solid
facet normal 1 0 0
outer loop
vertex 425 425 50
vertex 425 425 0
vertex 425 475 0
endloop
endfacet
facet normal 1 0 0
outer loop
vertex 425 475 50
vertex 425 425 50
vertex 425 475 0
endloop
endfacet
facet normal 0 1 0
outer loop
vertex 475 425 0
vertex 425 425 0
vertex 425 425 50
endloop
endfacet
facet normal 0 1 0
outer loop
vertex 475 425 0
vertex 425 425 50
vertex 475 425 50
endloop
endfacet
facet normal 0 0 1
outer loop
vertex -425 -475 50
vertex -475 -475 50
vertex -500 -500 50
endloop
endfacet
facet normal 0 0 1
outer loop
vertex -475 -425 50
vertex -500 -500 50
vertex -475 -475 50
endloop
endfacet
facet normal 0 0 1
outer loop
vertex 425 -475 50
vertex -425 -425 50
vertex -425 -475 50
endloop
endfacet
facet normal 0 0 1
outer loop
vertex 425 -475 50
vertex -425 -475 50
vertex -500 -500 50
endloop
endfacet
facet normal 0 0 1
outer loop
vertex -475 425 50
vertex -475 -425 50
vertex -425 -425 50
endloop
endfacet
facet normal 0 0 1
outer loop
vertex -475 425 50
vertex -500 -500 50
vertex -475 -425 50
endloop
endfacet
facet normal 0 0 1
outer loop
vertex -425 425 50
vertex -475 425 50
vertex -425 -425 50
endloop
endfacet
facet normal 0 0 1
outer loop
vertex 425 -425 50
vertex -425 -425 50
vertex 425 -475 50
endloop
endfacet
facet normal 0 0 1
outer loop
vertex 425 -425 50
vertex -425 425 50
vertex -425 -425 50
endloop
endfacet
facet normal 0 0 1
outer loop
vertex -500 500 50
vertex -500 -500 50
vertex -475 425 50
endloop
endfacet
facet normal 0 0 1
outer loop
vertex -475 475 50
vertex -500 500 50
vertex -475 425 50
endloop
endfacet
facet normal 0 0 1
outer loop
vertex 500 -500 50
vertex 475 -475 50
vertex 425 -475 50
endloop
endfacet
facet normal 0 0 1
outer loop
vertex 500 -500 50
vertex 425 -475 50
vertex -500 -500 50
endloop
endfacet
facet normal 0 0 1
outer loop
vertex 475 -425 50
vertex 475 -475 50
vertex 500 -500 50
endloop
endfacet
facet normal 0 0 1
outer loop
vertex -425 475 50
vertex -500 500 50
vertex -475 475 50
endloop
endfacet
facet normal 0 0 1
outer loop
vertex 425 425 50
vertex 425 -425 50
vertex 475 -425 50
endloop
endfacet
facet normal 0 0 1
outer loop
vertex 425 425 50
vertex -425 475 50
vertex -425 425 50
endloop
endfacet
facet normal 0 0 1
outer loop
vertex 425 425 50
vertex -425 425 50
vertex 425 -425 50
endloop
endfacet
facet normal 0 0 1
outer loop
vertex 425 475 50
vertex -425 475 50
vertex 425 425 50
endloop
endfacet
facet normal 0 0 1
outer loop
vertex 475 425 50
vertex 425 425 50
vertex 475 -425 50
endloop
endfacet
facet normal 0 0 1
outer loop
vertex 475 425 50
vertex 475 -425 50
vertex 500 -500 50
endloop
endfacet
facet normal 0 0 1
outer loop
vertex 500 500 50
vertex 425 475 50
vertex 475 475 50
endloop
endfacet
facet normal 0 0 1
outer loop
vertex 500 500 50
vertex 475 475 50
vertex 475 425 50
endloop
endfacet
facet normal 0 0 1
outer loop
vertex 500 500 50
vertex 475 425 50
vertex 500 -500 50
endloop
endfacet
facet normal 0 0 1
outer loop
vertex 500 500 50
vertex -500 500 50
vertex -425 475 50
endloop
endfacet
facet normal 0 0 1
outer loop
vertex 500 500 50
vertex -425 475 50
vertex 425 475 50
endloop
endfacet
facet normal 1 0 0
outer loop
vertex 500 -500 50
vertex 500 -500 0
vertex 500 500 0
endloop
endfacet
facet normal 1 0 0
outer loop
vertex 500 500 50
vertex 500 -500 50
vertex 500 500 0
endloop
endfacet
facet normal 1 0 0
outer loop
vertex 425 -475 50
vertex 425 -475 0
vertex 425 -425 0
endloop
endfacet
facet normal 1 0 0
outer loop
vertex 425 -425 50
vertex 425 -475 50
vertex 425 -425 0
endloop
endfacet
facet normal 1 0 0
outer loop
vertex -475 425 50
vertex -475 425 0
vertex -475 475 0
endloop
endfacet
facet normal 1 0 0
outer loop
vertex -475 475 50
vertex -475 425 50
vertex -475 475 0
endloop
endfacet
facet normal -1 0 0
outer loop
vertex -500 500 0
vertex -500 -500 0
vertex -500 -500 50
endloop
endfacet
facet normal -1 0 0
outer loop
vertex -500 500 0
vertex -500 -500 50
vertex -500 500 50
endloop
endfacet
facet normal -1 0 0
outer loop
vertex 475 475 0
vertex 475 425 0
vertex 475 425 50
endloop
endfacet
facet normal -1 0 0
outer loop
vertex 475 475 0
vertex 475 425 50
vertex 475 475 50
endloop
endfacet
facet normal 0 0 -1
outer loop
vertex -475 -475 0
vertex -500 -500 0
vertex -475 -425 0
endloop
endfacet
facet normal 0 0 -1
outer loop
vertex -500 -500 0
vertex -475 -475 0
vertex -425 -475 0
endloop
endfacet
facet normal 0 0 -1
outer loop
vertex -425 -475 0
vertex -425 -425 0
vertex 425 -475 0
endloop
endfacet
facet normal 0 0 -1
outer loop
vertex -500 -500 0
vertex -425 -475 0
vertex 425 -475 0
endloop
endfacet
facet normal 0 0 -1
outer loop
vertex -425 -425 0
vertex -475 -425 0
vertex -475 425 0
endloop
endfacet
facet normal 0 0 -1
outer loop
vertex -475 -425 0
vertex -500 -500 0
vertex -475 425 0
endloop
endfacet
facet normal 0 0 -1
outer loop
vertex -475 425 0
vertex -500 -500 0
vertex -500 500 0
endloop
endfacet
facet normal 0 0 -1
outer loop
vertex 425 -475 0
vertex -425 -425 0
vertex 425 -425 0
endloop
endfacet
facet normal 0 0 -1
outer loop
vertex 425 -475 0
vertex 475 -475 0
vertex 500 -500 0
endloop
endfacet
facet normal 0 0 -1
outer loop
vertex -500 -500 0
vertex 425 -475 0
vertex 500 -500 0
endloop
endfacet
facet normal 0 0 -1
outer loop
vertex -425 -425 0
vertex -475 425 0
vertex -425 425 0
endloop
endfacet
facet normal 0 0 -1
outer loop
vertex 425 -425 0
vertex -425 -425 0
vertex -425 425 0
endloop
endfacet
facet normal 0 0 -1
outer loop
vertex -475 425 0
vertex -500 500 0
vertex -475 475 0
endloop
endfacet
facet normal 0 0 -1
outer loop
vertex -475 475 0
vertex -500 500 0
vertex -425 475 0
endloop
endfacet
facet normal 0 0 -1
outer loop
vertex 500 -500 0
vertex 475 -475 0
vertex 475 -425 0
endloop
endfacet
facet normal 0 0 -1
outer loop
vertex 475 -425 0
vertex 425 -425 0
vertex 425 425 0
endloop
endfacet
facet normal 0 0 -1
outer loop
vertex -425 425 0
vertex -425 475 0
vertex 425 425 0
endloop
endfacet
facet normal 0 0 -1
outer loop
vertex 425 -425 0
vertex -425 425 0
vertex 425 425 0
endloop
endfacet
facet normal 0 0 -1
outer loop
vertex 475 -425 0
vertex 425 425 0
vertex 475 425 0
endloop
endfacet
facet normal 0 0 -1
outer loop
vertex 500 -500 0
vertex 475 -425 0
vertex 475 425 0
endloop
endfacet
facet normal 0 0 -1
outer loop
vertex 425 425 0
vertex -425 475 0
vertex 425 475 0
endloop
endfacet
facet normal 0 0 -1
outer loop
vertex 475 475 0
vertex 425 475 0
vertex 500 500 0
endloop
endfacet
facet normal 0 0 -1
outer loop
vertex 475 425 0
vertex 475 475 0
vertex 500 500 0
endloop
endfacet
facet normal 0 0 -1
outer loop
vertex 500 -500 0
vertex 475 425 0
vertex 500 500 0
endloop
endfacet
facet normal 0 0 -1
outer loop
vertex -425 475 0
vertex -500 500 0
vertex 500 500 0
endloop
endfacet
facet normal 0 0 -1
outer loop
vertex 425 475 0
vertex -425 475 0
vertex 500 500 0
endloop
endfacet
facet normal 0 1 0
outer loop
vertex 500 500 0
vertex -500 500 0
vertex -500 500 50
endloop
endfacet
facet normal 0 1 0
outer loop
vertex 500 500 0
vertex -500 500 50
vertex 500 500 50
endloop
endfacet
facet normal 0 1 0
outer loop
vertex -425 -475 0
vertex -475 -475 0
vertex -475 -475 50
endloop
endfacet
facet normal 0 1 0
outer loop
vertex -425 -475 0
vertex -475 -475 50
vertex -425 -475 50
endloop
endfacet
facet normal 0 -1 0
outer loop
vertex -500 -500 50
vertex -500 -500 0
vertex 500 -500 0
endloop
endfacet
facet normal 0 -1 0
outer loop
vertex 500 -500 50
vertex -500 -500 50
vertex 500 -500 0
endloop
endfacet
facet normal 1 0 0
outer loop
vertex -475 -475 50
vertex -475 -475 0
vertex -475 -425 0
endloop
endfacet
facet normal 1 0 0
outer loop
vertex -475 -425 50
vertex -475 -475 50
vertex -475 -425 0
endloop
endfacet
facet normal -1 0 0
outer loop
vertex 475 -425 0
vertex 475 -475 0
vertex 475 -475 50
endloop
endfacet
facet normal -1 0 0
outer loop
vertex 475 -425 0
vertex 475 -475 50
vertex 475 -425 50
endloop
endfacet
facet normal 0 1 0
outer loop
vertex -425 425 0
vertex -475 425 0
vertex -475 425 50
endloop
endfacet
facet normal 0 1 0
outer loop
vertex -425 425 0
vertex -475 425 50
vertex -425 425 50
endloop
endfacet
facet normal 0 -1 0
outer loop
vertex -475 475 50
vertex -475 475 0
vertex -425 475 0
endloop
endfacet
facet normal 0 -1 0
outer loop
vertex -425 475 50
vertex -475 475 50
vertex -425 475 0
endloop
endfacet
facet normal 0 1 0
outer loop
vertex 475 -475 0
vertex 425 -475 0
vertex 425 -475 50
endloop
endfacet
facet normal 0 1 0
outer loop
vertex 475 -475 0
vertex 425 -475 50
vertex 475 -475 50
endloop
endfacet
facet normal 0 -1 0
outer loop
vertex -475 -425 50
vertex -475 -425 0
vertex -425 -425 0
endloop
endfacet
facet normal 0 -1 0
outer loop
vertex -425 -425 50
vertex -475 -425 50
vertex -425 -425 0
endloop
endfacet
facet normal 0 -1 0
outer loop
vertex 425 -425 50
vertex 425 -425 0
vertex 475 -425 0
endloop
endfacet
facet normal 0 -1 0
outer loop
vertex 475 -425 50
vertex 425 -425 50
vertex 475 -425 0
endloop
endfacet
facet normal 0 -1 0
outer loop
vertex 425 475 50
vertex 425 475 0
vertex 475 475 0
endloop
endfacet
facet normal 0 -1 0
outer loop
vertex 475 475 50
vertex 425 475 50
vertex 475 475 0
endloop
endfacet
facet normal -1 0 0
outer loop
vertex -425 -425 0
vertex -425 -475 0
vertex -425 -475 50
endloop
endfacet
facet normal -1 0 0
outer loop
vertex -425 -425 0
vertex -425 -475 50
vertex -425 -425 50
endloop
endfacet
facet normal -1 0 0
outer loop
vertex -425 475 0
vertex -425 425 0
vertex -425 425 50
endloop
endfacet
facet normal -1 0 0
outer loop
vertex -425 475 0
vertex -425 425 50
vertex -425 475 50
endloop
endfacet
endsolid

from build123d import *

# Parameters (mm, degrees)
SKETCH_1_W          = 1000
SKETCH_1_H          = 1000
EXTRUDE_1_DEPTH     = 50
SKETCH_2_W          = 50
SKETCH_2_H          = 50
CUT_EXTRUDE_1_DEPTH = 709.872343938
SKETCH_3_W          = 50
SKETCH_3_H          = 50
CUT_EXTRUDE_2_DEPTH = 709.872343938
SKETCH_4_W          = 50
SKETCH_4_H          = 50
CUT_EXTRUDE_3_DEPTH = 709.872343938
SKETCH_5_W          = 50
SKETCH_5_H          = 50
CUT_EXTRUDE_4_DEPTH = 709.872343938


with BuildPart() as part:
    # 草图1 → 凸台-拉伸1 (new body)
    with BuildSketch(Plane.XY):
        Rectangle(SKETCH_1_W, SKETCH_1_H)
    extrude(amount=EXTRUDE_1_DEPTH)

    # 草图2 → 切除-拉伸1 (cut, through all)
    with BuildSketch(Plane.XY):
        with Locations((450, 450)):
            Rectangle(SKETCH_2_W, SKETCH_2_H)
    extrude(amount=CUT_EXTRUDE_1_DEPTH, mode=Mode.SUBTRACT)

    # 草图3 → 切除-拉伸2 (cut, through all)
    with BuildSketch(Plane.XY):
        with Locations((-450, 450)):
            Rectangle(SKETCH_3_W, SKETCH_3_H)
    extrude(amount=CUT_EXTRUDE_2_DEPTH, mode=Mode.SUBTRACT)

    # 草图4 → 切除-拉伸3 (cut, through all)
    with BuildSketch(Plane.XY):
        with Locations((450, -450)):
            Rectangle(SKETCH_4_W, SKETCH_4_H)
    extrude(amount=CUT_EXTRUDE_3_DEPTH, mode=Mode.SUBTRACT)

    # 草图5 → 切除-拉伸4 (cut, through all)
    with BuildSketch(Plane.XY):
        with Locations((-450, -450)):
            Rectangle(SKETCH_5_W, SKETCH_5_H)
    extrude(amount=CUT_EXTRUDE_4_DEPTH, mode=Mode.SUBTRACT)


solid = part.part
